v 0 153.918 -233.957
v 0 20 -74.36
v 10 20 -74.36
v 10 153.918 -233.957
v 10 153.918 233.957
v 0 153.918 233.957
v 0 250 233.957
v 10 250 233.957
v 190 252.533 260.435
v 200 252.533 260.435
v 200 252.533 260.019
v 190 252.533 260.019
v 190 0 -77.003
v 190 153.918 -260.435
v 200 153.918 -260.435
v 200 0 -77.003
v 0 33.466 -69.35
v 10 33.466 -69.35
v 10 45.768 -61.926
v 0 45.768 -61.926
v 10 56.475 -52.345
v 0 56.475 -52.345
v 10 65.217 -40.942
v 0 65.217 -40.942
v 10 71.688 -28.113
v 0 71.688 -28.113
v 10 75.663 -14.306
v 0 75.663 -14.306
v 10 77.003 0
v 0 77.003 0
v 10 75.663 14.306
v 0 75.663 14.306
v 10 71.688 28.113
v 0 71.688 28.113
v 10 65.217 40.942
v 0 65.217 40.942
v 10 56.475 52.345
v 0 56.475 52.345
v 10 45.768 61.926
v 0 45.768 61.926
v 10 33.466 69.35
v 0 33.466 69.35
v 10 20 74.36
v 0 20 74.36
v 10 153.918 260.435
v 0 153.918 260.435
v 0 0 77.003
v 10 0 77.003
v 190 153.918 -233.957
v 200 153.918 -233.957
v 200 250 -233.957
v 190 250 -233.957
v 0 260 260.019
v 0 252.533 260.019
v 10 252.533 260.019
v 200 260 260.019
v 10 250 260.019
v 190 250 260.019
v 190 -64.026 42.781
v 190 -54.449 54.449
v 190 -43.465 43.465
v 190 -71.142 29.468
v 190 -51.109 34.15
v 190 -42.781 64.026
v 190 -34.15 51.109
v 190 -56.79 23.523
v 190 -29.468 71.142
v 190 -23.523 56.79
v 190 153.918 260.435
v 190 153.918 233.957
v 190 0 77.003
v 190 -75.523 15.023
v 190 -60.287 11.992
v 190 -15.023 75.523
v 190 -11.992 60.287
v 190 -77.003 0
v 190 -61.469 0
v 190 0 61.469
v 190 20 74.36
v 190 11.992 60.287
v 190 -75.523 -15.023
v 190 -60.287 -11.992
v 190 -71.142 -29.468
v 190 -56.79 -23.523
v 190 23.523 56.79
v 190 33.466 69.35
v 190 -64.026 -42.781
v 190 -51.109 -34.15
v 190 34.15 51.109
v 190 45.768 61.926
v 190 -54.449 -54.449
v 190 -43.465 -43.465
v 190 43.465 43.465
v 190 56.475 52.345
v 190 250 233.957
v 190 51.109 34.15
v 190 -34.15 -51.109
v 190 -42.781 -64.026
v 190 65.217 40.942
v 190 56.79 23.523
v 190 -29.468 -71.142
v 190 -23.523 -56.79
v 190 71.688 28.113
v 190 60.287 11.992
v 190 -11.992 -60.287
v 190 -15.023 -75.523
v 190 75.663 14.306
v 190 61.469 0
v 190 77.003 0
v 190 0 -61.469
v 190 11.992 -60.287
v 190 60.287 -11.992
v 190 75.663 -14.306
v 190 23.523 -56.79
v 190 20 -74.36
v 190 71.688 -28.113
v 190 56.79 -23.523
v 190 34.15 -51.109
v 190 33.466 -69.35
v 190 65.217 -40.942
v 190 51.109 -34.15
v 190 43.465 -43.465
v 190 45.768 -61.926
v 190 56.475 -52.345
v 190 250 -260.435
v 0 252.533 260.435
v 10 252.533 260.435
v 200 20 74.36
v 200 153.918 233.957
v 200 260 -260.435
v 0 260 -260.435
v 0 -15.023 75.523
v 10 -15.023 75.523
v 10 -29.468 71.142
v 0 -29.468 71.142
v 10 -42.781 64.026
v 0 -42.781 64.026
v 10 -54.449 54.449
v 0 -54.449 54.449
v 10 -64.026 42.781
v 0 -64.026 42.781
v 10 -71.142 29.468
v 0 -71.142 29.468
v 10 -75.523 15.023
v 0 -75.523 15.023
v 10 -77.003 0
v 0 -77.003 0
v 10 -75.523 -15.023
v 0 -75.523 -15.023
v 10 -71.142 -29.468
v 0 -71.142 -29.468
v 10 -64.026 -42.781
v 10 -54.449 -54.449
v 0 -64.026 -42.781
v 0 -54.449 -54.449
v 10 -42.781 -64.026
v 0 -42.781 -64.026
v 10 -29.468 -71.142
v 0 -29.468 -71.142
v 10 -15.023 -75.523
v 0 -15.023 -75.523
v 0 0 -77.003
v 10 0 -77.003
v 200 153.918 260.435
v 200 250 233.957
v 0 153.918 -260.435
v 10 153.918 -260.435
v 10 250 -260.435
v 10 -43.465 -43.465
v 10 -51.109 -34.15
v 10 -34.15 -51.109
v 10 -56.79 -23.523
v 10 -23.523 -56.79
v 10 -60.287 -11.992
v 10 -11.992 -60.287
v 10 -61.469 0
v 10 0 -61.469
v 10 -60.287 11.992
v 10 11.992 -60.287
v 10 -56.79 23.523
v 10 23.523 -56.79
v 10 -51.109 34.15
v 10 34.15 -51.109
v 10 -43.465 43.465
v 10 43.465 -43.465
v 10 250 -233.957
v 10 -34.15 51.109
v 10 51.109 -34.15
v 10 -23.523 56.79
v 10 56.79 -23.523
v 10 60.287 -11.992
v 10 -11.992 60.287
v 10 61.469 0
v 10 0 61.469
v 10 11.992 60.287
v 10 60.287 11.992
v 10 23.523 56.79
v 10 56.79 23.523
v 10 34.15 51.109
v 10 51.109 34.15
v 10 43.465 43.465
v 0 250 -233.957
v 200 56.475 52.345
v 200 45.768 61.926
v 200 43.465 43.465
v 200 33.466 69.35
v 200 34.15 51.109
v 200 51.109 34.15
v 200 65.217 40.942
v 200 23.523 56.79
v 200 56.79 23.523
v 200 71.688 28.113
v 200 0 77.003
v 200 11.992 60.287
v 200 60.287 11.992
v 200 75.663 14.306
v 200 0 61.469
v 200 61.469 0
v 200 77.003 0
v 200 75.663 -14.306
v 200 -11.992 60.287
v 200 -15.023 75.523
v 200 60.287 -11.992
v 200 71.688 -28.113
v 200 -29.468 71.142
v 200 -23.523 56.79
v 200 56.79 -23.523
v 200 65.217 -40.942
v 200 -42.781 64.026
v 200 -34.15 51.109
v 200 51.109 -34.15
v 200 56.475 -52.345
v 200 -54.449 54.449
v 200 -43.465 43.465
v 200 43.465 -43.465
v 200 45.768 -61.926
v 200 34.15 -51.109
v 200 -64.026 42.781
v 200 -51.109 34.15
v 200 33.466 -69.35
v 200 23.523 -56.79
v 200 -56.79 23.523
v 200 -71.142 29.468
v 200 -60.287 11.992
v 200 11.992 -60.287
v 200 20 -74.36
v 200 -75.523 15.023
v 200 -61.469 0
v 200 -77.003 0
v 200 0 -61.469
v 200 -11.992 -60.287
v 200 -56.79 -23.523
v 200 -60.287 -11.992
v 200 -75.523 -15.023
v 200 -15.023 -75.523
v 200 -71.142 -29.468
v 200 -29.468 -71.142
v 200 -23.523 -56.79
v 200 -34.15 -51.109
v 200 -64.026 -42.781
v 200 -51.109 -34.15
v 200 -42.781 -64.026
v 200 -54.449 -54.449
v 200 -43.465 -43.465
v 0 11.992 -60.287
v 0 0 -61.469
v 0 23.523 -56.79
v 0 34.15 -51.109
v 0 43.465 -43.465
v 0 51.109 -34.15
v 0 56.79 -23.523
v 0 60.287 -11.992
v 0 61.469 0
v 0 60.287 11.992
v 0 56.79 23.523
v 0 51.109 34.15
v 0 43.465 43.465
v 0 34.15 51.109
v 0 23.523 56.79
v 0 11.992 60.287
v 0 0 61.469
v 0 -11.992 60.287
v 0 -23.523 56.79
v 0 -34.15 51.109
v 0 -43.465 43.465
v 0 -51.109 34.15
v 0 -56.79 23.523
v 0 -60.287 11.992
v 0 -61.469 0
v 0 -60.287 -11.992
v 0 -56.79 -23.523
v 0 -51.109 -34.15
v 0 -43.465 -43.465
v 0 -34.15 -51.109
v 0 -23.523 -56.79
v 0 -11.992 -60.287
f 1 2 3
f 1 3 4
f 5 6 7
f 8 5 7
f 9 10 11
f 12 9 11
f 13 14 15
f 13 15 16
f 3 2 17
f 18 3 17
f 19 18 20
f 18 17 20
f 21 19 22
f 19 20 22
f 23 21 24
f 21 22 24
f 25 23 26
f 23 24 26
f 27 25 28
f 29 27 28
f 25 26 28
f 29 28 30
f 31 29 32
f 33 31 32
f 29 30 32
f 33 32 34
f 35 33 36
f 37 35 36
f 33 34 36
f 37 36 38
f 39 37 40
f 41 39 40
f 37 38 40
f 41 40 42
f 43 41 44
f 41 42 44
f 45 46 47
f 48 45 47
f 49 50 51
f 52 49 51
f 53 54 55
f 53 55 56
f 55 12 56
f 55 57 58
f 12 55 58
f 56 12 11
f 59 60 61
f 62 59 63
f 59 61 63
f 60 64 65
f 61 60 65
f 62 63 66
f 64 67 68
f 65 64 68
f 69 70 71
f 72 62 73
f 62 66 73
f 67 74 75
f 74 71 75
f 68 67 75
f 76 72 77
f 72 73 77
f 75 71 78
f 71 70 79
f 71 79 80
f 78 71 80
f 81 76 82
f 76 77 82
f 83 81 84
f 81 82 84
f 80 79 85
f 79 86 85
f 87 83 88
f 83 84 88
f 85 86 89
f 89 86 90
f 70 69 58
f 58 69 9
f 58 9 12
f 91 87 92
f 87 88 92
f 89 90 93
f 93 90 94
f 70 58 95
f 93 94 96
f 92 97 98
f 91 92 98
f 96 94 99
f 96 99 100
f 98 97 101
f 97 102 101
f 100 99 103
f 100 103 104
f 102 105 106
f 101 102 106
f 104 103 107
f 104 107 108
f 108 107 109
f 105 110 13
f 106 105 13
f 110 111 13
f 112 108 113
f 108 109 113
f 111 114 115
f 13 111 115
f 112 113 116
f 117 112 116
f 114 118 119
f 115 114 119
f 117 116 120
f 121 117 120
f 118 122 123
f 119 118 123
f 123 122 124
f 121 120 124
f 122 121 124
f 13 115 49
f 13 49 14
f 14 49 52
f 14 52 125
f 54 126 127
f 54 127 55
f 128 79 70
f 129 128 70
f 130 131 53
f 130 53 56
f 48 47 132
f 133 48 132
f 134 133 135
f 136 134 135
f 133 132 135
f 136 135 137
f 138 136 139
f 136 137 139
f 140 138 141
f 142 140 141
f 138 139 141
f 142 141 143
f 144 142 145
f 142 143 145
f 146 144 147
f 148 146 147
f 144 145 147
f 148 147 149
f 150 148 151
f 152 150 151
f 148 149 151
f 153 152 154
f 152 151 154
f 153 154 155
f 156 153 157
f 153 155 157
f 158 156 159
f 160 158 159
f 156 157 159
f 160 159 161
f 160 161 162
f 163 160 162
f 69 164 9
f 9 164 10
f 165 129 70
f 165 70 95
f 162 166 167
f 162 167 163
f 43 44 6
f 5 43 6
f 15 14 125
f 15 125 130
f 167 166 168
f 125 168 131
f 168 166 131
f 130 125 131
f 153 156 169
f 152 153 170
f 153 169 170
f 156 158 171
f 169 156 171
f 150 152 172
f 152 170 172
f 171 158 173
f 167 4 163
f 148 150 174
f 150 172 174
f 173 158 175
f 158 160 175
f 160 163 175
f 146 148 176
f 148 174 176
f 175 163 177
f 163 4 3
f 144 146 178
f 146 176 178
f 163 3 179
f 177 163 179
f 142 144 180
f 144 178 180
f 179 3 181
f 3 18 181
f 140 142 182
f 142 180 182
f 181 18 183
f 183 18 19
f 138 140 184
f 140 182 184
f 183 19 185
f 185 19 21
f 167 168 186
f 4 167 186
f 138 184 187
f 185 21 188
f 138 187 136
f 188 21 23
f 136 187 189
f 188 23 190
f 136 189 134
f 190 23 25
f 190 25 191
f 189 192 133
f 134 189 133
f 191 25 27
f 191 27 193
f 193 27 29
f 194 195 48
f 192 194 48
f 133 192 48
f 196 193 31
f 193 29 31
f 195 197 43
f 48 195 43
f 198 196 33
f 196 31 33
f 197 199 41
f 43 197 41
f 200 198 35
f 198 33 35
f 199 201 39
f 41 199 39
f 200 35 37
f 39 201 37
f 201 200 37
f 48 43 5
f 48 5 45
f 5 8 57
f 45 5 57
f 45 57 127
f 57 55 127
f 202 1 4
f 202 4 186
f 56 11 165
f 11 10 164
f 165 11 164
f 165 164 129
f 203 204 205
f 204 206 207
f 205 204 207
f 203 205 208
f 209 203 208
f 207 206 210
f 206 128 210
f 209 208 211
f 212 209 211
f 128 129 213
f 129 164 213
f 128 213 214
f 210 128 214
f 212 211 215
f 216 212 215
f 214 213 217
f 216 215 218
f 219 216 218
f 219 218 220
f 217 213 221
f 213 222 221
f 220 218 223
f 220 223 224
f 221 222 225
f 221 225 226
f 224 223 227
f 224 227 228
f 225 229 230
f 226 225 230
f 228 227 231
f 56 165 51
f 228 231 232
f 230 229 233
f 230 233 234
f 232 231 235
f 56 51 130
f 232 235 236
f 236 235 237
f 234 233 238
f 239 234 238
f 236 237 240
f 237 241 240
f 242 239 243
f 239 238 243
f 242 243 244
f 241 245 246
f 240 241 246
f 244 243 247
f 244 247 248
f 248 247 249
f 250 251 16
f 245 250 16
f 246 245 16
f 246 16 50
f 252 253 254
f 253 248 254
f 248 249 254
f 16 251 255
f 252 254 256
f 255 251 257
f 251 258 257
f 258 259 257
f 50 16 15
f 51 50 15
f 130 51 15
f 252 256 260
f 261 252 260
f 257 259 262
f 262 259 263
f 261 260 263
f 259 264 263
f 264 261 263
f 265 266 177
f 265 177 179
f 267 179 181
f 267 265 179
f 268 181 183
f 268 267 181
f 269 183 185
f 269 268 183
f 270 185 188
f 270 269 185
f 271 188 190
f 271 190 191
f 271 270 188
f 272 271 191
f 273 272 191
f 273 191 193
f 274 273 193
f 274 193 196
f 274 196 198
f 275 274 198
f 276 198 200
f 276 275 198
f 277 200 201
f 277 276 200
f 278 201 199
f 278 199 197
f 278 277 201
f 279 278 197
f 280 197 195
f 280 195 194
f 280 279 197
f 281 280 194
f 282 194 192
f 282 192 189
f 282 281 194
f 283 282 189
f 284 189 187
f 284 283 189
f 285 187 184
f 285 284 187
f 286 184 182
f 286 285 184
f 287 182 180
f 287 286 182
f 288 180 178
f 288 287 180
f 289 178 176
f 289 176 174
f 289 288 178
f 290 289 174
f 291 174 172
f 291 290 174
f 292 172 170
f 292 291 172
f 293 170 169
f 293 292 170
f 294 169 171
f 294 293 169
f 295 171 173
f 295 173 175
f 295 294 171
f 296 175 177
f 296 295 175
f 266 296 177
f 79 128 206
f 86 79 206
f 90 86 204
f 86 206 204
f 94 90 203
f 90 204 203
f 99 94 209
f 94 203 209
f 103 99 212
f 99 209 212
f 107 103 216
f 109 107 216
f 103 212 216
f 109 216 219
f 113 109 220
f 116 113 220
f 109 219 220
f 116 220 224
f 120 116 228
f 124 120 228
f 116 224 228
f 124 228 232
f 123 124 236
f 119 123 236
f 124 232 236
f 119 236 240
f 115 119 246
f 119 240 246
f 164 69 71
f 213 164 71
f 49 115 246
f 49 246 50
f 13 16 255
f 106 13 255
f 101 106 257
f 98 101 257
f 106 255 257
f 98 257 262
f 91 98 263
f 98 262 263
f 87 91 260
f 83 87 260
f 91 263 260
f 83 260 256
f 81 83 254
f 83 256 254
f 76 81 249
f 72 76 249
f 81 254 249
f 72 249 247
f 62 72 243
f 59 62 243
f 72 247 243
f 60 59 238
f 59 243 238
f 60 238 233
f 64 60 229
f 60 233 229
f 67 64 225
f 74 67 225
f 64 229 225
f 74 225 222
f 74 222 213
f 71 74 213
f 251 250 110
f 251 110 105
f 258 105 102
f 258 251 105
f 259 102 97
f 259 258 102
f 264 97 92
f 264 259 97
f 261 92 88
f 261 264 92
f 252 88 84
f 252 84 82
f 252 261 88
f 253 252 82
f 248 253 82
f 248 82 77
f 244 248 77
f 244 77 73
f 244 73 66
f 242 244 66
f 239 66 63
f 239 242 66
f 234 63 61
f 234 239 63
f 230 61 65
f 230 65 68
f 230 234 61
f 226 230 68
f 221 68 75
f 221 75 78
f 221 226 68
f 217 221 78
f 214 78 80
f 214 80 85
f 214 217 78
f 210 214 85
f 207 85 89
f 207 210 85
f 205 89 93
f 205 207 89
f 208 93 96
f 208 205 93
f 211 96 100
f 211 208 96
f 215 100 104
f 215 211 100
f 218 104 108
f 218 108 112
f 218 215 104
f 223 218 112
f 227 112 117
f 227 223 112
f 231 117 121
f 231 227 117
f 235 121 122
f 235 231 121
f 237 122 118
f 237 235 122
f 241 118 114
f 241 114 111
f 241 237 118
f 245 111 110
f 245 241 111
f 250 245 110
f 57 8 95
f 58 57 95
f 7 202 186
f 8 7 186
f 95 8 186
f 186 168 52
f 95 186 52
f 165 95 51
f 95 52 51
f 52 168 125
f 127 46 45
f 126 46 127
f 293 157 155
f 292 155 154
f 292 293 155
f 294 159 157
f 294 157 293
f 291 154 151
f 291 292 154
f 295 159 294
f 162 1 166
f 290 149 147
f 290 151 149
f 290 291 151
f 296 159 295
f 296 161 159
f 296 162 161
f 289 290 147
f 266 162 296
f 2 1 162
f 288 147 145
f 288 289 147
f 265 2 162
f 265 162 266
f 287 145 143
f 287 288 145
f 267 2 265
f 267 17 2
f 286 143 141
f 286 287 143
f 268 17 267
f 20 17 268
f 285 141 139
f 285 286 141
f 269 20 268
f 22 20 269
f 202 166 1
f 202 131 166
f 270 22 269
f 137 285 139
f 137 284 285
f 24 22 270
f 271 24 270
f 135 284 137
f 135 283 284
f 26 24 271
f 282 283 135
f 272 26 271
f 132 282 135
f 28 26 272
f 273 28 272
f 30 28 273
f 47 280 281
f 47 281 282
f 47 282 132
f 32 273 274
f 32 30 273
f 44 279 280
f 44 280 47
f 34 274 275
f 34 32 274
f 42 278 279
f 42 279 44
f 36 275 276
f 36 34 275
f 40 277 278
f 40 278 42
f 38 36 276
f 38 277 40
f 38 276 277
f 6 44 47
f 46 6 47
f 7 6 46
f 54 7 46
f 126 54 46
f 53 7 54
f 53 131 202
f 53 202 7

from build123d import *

# Parameters (mm, degrees)
SKETCH1_R           = 77.003067154
SKETCH1_R_2         = 61.468535345
BOSS_EXTRUDE1_DEPTH = 10
BOSS_EXTRUDE2_DEPTH = 10
SKETCH3_W           = 26.477717066
SKETCH3_H           = 98.615222644
BOSS_EXTRUDE3_DEPTH = 10
SKETCH5_R           = 77.003067154
SKETCH5_R_2         = 61.468535345
BOSS_EXTRUDE4_DEPTH = 10
BOSS_EXTRUDE5_START = 10
BOSS_EXTRUDE5_DEPTH = 10
SKETCH8_W           = 26.477717066
SKETCH8_H           = 98.615222644
BOSS_EXTRUDE6_DEPTH = 10
SKETCH9_W           = 200
SKETCH9_H           = 520.453768192
BOSS_EXTRUDE7_DEPTH = 10


with BuildPart() as part:
    # Sketch1 → Boss-Extrude1 (new body)
    with BuildSketch(Plane(origin=(0, 0, 0), x_dir=(0, 0, -1), z_dir=(1, 0, 0))):
        Circle(SKETCH1_R)
        Circle(SKETCH1_R_2, mode=Mode.SUBTRACT)
    extrude(amount=BOSS_EXTRUDE1_DEPTH)

    # Sketch2 → Boss-Extrude2 (add)
    with BuildSketch(Plane(origin=(0, 0, 0), x_dir=(0, 0, -1), z_dir=(1, 0, 0))):
        with BuildLine():
            Line((-74.36042194, 20), (-233.957245684, 153.917635941))
            Line((-233.957245684, 153.917635941), (-260.43496275, 153.917635941))
            Line((-260.43496275, 153.917635941), (-77.003067154, 0))
            ThreePointArc((-77.003067154, 0), (-76.339547141, 10.086916944), (-74.36042194, 20))
        make_face()
    boss_extrude2 = extrude(amount=BOSS_EXTRUDE2_DEPTH)

    # Sketch3 → Boss-Extrude3 (add)
    with BuildSketch(Plane(origin=(0, 0, 0), x_dir=(0, 0, -1), z_dir=(1, 0, 0))):
        with Locations((-247.196104217, 203.225247263)):
            Rectangle(SKETCH3_W, SKETCH3_H)
    boss_extrude3 = extrude(amount=BOSS_EXTRUDE3_DEPTH)

    # Mirror2: Boss-Extrude2, Boss-Extrude3 across plane
    add(boss_extrude2.mirror(Plane.XY))
    add(boss_extrude3.mirror(Plane.XY))



with BuildPart() as body_2:
    # Sketch5 → Boss-Extrude4 (new body)
    with BuildSketch(Plane.ZY.offset(-200)):
        Circle(SKETCH5_R)
        with Locations(Location((0, 0, 0), (0, 0, 180))):
            Circle(SKETCH5_R_2, mode=Mode.SUBTRACT)
    extrude(amount=BOSS_EXTRUDE4_DEPTH)

    # Sketch7 → Boss-Extrude5 (add)
    with BuildSketch(Plane.ZY.offset(-200).offset(BOSS_EXTRUDE5_START)):
        with BuildLine():
            Line((-74.36042194, 20), (-233.957245684, 153.917635941))
            Line((-233.957245684, 153.917635941), (-260.43496275, 153.917635941))
            Line((-260.43496275, 153.917635941), (-77.003067154, 0))
            ThreePointArc((-77.003067154, 0), (-76.339547141, 10.086916944), (-74.36042194, 20))
        make_face()
    boss_extrude5 = extrude(amount=-BOSS_EXTRUDE5_DEPTH)

    # Sketch8 → Boss-Extrude6 (add)
    with BuildSketch(Plane.ZY.offset(-200)):
        with Locations((-247.196104217, 203.225247263)):
            Rectangle(SKETCH8_W, SKETCH8_H)
    boss_extrude6 = extrude(amount=BOSS_EXTRUDE6_DEPTH)

    # Mirror5: Boss-Extrude5 across plane
    add(boss_extrude5.mirror(Plane.XY))

    # Mirror6: Boss-Extrude6 across plane
    add(boss_extrude6.mirror(Plane.XY))


with BuildPart() as part_1:
    add(part.part)

    add(body_2.part)  # Boss-Extrude7 merges body 2
    # Sketch9 → Boss-Extrude7 (add)
    with BuildSketch(Plane(origin=(0, 250, 0), x_dir=(1, 0, 0), z_dir=(0, 1, 0))):
        with Locations((100, 0.208078654)):
            Rectangle(SKETCH9_W, SKETCH9_H)
    extrude(amount=BOSS_EXTRUDE7_DEPTH)


solid = part_1.part
